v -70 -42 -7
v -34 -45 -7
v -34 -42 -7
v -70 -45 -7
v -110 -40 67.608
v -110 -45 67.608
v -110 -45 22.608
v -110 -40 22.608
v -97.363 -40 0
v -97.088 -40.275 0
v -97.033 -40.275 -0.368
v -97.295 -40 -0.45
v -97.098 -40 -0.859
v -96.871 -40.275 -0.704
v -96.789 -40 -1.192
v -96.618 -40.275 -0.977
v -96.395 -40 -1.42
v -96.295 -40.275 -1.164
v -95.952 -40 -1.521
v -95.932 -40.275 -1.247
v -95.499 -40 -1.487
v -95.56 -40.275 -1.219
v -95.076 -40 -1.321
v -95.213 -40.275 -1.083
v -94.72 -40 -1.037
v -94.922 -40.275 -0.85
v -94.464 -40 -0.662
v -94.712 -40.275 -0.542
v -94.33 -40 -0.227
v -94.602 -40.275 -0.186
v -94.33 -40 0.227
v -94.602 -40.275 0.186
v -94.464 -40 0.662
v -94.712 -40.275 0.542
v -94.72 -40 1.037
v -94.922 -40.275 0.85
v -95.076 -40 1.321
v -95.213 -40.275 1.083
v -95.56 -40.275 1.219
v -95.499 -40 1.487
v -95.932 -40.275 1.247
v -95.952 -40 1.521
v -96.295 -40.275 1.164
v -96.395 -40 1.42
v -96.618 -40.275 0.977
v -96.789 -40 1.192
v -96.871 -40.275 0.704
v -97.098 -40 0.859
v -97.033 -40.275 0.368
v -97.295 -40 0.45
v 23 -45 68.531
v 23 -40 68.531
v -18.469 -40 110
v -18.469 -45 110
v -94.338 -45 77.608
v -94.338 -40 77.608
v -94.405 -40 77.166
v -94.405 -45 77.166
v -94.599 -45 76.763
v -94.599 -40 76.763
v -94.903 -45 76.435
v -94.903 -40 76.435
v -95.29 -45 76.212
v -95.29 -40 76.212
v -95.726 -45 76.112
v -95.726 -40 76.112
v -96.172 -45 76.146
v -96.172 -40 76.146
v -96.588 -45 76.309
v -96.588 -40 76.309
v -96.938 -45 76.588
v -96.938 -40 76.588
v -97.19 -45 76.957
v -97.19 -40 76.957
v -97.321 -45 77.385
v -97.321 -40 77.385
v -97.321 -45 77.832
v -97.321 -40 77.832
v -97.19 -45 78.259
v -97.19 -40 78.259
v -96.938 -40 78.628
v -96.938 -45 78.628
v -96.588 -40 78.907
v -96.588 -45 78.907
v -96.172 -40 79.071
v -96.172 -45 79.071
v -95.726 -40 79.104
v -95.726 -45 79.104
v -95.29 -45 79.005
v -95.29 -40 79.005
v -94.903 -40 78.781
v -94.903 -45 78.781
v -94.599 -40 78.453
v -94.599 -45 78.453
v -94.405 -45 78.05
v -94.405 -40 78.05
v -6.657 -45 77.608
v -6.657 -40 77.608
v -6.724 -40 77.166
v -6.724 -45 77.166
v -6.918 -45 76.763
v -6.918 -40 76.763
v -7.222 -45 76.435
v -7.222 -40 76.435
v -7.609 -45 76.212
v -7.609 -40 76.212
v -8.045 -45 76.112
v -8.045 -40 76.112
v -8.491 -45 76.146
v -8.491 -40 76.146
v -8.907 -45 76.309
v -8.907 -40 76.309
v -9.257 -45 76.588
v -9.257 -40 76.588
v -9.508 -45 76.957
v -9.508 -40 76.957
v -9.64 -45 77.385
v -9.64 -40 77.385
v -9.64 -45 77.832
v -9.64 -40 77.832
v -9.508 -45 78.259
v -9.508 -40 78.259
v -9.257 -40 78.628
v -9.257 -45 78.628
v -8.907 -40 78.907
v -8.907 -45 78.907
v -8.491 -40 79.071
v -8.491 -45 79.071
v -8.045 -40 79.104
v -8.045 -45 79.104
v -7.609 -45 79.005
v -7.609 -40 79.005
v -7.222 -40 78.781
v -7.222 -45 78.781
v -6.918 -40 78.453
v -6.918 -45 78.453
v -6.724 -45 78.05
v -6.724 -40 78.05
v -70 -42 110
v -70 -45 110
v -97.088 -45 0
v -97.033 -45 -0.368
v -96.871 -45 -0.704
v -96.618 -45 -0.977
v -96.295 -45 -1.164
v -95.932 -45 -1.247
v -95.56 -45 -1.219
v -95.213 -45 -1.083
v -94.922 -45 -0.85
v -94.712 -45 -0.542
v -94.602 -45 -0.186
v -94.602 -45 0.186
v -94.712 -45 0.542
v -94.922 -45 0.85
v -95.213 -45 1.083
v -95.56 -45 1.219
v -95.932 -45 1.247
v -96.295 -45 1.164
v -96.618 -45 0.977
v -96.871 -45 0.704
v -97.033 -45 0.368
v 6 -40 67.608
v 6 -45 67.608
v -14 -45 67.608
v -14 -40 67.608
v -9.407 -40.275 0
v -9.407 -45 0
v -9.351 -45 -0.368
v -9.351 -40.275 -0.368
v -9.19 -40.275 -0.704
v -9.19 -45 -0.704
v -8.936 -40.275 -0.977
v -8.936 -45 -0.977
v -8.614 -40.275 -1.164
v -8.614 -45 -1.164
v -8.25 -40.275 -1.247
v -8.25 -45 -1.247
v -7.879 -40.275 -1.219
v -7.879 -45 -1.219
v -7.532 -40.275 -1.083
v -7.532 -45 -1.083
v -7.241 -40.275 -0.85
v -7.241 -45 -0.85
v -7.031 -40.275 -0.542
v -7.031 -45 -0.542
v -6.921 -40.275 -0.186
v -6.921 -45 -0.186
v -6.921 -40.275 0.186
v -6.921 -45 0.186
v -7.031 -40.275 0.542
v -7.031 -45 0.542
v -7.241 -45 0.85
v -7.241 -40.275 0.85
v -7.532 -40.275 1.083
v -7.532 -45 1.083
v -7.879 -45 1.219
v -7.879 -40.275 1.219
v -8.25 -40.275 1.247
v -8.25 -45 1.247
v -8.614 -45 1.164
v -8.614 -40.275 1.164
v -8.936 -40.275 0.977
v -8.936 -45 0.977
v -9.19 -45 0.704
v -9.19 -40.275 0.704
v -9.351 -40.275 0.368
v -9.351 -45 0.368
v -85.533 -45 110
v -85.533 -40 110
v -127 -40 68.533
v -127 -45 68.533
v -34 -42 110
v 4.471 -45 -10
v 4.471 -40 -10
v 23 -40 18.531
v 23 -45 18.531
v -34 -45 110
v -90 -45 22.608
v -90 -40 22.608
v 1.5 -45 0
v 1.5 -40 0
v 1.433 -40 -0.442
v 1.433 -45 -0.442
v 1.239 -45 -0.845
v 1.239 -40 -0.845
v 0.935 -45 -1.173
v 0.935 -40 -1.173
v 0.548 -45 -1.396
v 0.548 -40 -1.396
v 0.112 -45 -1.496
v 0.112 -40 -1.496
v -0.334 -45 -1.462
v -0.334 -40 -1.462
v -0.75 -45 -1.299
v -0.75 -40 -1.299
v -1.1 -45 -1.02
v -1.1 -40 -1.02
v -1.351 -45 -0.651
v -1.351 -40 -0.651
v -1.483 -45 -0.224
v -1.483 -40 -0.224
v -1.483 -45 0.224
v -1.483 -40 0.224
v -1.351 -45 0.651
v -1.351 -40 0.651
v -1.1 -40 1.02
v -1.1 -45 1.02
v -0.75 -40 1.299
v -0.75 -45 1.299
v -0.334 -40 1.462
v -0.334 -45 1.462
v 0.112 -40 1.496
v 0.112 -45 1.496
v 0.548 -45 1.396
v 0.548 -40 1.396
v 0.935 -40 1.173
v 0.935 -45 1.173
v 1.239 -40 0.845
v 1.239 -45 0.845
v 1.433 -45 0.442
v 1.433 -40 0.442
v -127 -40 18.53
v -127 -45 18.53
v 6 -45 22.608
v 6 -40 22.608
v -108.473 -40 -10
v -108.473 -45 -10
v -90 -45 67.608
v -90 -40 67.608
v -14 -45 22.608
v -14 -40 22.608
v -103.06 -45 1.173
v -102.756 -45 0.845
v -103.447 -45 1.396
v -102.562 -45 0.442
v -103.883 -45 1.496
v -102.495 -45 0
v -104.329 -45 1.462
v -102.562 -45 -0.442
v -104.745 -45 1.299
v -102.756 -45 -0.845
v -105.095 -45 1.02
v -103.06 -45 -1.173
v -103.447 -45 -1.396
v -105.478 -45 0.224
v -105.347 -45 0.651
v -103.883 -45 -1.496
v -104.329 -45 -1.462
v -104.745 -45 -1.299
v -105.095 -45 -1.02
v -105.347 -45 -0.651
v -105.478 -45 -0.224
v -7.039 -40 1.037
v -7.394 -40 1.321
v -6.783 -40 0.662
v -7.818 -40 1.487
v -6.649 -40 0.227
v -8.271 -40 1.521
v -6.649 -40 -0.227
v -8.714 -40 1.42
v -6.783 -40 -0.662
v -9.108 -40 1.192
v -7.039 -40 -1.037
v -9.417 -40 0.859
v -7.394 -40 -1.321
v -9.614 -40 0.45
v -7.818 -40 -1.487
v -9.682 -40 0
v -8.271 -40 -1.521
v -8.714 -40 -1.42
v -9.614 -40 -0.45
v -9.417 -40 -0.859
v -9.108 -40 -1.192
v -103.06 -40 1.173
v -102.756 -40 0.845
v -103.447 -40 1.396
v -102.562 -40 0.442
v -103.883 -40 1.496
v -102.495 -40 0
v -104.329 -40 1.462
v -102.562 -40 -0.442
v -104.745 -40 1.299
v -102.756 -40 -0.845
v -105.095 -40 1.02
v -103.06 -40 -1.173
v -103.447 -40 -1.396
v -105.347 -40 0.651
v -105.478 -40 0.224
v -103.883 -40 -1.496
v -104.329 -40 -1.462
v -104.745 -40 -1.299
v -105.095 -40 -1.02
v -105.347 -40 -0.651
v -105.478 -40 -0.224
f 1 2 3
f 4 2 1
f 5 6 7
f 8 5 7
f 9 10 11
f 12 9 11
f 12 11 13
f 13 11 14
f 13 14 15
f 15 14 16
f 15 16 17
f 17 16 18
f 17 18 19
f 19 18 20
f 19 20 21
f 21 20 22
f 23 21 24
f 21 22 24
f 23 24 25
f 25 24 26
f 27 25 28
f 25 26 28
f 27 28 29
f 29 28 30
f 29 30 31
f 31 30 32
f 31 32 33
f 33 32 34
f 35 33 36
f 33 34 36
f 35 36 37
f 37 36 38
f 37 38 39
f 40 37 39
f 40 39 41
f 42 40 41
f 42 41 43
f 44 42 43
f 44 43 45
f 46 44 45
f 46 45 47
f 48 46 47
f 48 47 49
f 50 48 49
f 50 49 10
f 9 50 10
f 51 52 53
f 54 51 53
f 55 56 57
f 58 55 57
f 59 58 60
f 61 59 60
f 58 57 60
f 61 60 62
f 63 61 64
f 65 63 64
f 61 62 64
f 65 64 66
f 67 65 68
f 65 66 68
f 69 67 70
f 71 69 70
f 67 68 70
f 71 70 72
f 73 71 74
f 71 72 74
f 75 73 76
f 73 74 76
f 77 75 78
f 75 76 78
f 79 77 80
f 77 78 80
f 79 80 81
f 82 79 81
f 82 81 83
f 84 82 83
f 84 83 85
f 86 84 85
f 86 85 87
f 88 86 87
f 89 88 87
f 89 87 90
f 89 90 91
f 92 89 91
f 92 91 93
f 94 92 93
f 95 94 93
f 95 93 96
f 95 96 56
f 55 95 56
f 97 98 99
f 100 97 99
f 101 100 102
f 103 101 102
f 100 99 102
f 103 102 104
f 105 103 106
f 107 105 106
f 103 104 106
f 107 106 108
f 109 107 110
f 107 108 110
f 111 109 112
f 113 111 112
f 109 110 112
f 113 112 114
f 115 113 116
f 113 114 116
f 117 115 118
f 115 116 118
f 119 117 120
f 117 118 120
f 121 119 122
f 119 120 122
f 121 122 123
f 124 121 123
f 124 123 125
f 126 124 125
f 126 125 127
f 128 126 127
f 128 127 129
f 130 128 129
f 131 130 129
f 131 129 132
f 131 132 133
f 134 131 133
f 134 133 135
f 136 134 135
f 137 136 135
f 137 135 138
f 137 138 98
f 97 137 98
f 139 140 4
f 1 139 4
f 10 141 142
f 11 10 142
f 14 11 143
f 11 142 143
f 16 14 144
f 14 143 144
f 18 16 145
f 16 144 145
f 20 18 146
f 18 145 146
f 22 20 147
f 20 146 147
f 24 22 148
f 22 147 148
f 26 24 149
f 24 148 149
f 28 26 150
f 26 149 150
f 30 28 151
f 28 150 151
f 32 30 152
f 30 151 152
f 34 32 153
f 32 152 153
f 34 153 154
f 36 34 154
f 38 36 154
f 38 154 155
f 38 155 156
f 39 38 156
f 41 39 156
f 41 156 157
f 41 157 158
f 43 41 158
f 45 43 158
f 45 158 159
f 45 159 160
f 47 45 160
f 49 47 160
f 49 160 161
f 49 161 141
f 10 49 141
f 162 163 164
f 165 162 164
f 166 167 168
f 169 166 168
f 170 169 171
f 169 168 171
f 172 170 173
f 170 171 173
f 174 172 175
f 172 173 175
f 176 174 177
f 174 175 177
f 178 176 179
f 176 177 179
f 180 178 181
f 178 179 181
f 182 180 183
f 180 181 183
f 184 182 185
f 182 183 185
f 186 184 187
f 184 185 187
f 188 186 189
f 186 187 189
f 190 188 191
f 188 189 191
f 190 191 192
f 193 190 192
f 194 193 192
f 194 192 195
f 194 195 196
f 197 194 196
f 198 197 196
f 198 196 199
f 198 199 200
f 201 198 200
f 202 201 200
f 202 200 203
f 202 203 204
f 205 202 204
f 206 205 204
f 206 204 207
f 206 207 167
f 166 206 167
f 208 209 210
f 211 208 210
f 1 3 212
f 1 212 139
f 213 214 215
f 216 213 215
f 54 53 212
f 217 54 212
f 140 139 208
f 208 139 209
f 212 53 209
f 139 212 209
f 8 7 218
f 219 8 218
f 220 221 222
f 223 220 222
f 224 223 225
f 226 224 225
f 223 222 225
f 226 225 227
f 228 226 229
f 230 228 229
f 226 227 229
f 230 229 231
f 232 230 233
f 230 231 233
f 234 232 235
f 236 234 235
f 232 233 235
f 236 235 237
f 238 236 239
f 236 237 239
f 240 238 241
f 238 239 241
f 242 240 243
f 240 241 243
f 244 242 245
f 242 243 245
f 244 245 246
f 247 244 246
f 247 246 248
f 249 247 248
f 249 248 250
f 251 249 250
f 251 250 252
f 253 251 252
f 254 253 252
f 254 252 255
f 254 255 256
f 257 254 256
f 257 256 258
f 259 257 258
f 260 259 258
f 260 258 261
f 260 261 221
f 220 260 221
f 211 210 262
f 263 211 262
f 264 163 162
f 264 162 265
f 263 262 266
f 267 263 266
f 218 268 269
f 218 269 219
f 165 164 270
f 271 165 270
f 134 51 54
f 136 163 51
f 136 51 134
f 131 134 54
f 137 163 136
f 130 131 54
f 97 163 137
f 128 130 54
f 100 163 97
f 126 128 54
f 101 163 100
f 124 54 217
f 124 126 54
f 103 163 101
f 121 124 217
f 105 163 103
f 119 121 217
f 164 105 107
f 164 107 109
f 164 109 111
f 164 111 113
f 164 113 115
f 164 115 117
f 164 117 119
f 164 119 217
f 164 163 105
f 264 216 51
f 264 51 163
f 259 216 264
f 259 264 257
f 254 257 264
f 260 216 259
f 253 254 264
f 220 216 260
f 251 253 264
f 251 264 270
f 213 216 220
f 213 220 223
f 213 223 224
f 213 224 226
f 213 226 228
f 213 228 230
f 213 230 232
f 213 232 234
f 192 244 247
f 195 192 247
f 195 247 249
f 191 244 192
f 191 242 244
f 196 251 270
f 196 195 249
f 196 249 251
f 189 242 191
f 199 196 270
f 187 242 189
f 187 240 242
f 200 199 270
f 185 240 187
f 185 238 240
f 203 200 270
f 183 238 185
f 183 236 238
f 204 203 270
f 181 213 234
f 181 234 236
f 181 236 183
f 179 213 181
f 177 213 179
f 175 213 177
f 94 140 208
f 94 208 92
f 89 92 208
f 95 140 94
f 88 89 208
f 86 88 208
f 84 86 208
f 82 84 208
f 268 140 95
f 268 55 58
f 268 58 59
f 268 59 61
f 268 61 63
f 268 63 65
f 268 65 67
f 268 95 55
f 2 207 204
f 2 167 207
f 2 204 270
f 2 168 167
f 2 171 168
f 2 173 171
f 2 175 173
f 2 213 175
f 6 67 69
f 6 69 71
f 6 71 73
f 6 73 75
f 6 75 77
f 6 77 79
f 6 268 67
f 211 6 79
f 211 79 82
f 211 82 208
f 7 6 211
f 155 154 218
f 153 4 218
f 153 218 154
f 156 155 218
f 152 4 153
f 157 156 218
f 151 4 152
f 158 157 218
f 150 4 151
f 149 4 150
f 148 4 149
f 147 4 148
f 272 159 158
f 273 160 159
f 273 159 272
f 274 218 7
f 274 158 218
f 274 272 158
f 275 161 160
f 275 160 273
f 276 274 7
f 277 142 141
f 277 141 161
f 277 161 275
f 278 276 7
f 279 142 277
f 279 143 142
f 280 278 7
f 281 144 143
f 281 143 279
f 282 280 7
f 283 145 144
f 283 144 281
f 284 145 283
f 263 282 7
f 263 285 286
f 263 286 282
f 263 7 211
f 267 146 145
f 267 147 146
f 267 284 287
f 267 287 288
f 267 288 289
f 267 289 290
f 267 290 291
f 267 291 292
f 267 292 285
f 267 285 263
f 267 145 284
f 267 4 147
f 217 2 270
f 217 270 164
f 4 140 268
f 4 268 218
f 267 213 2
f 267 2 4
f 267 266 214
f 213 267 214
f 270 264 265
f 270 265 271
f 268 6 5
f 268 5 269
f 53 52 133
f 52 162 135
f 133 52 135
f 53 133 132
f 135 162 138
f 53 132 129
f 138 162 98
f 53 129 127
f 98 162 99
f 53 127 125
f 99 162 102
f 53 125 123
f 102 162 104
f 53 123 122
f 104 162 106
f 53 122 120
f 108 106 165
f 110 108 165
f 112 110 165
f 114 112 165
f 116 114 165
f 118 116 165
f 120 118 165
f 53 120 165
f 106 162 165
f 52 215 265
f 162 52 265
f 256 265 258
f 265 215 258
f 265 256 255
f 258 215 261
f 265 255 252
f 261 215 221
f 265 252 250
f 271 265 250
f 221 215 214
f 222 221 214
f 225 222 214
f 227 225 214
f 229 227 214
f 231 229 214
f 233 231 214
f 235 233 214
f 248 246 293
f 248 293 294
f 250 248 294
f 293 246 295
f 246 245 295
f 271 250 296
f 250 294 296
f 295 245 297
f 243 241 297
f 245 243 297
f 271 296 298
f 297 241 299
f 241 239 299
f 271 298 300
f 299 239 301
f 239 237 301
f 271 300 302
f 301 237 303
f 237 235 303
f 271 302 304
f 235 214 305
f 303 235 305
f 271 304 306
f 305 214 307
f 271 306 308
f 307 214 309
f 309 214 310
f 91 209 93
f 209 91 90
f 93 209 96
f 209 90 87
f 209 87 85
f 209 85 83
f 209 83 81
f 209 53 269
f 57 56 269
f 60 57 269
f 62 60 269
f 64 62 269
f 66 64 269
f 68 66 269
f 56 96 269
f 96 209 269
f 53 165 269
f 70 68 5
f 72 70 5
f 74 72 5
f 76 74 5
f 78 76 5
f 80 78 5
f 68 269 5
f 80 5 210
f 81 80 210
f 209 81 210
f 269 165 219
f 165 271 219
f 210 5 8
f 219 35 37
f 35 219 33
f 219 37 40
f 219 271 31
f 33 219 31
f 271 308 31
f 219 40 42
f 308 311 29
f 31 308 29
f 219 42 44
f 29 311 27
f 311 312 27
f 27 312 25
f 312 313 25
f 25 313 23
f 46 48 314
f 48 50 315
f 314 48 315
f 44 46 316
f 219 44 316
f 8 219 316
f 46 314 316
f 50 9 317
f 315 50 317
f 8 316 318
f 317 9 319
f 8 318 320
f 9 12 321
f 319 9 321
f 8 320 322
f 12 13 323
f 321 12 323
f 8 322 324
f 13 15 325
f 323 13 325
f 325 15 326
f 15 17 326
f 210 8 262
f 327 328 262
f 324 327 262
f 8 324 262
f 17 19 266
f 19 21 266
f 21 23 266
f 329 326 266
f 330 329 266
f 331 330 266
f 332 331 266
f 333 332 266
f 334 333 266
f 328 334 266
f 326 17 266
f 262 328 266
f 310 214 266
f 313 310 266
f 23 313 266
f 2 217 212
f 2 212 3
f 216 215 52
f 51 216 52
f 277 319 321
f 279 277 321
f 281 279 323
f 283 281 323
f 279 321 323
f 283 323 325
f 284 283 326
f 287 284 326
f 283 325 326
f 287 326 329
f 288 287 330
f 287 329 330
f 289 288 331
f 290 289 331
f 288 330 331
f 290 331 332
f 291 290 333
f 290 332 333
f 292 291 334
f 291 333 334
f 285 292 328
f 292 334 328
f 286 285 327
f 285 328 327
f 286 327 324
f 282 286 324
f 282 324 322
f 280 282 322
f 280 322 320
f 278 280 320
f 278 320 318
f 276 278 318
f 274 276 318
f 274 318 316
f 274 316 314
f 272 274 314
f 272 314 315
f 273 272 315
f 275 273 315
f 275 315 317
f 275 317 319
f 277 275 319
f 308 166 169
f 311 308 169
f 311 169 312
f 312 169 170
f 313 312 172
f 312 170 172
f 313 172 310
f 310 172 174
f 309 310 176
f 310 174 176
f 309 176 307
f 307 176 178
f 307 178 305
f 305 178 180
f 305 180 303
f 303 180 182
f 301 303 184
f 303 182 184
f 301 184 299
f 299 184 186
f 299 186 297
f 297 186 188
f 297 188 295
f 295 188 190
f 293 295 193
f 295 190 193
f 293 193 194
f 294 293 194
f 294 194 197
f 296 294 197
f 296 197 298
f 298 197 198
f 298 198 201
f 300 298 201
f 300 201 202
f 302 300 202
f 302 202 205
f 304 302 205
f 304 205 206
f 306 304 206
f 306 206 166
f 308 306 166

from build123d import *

# Parameters (mm, degrees)
BOSS_EXTRUDE1_DEPTH             = 5
F_3_0_3_DIAMETER_HOLE1_D        = 3
F_3_0_3_DIAMETER_HOLE1_DEPTH    = 6
F_3_0_3_DIAMETER_HOLE1_TIP      = 0.901290929
SKETCH6_W                       = 36
SKETCH6_H                       = 124
CUT_EXTRUDE1_DEPTH              = 3
SKETCH9_W                       = 20
SKETCH9_H                       = 45
CUT_EXTRUDE3_DEPTH              = 6
M3X0_5_TAPPED_HOLE1_D           = 2.5
M3X0_5_TAPPED_HOLE1_DEPTH       = 5
M3X0_5_TAPPED_HOLE1_CSINK_D     = 3.05
M3X0_5_TAPPED_HOLE1_CSINK_ANGLE = 90


with BuildPart() as part:
    # Sketch3 → Boss-Extrude1 (new body)
    with BuildSketch(Plane(origin=(0, -40, 0), x_dir=(-1, 0, 0), z_dir=(0, -1, 0))):
        Polygon((18.468579028, -110), (85.532661839, -110), (127, -68.532661839), (127, -18.529510204), (108.472719443, 10), (-4.471478576, 10), (-23, -18.531420972), (-23, -68.531420972), align=None)
    extrude(amount=BOSS_EXTRUDE1_DEPTH)

    # Ø3.0 (3) Diameter Hole1
    with Locations(Plane(origin=(0, -45, 0), x_dir=(-1, 0, 0), z_dir=(0, -1, 0))):
        with Locations((8.156954779, -77.608240604), (95.838195646, -77.608240604), (103.995150425, 0), (0, 0)):
            Hole(F_3_0_3_DIAMETER_HOLE1_D / 2, depth=F_3_0_3_DIAMETER_HOLE1_DEPTH)
            with Locations((0, 0, -(F_3_0_3_DIAMETER_HOLE1_DEPTH + F_3_0_3_DIAMETER_HOLE1_TIP / 2))):  # 118° drill point
                Cone(0, F_3_0_3_DIAMETER_HOLE1_D / 2, F_3_0_3_DIAMETER_HOLE1_TIP, mode=Mode.SUBTRACT)

    # Sketch6 → Cut-Extrude1 (cut)
    with BuildSketch(Plane(origin=(0, -45, 0), x_dir=(-1, 0, 0), z_dir=(0, -1, 0))):
        with Locations((52, -55)):
            Rectangle(SKETCH6_W, SKETCH6_H)
    extrude(amount=-CUT_EXTRUDE1_DEPTH, mode=Mode.SUBTRACT)

    # Sketch9 → Cut-Extrude3 (cut, through all)
    with BuildSketch(Plane(origin=(0, -45, 0), x_dir=(-1, 0, 0), z_dir=(0, -1, 0))):
        with Locations((4, -45.108240604)):
            Rectangle(SKETCH9_W, SKETCH9_H)
    cut_extrude3 = extrude(amount=-CUT_EXTRUDE3_DEPTH, mode=Mode.SUBTRACT)

    # Mirror1: Cut-Extrude3 across plane
    add(cut_extrude3.mirror(Plane.ZY.offset(52)), mode=Mode.SUBTRACT)

    # M3x0.5 Tapped Hole1
    with Locations(Plane(origin=(0, -40, 0), x_dir=(1, 0, 0), z_dir=(0, 1, 0))):
        with Locations((-8.156954779, 0), (-95.838195646, 0)):
            CounterSinkHole(M3X0_5_TAPPED_HOLE1_D / 2, M3X0_5_TAPPED_HOLE1_CSINK_D / 2, depth=M3X0_5_TAPPED_HOLE1_DEPTH, counter_sink_angle=M3X0_5_TAPPED_HOLE1_CSINK_ANGLE)


solid = part.part
